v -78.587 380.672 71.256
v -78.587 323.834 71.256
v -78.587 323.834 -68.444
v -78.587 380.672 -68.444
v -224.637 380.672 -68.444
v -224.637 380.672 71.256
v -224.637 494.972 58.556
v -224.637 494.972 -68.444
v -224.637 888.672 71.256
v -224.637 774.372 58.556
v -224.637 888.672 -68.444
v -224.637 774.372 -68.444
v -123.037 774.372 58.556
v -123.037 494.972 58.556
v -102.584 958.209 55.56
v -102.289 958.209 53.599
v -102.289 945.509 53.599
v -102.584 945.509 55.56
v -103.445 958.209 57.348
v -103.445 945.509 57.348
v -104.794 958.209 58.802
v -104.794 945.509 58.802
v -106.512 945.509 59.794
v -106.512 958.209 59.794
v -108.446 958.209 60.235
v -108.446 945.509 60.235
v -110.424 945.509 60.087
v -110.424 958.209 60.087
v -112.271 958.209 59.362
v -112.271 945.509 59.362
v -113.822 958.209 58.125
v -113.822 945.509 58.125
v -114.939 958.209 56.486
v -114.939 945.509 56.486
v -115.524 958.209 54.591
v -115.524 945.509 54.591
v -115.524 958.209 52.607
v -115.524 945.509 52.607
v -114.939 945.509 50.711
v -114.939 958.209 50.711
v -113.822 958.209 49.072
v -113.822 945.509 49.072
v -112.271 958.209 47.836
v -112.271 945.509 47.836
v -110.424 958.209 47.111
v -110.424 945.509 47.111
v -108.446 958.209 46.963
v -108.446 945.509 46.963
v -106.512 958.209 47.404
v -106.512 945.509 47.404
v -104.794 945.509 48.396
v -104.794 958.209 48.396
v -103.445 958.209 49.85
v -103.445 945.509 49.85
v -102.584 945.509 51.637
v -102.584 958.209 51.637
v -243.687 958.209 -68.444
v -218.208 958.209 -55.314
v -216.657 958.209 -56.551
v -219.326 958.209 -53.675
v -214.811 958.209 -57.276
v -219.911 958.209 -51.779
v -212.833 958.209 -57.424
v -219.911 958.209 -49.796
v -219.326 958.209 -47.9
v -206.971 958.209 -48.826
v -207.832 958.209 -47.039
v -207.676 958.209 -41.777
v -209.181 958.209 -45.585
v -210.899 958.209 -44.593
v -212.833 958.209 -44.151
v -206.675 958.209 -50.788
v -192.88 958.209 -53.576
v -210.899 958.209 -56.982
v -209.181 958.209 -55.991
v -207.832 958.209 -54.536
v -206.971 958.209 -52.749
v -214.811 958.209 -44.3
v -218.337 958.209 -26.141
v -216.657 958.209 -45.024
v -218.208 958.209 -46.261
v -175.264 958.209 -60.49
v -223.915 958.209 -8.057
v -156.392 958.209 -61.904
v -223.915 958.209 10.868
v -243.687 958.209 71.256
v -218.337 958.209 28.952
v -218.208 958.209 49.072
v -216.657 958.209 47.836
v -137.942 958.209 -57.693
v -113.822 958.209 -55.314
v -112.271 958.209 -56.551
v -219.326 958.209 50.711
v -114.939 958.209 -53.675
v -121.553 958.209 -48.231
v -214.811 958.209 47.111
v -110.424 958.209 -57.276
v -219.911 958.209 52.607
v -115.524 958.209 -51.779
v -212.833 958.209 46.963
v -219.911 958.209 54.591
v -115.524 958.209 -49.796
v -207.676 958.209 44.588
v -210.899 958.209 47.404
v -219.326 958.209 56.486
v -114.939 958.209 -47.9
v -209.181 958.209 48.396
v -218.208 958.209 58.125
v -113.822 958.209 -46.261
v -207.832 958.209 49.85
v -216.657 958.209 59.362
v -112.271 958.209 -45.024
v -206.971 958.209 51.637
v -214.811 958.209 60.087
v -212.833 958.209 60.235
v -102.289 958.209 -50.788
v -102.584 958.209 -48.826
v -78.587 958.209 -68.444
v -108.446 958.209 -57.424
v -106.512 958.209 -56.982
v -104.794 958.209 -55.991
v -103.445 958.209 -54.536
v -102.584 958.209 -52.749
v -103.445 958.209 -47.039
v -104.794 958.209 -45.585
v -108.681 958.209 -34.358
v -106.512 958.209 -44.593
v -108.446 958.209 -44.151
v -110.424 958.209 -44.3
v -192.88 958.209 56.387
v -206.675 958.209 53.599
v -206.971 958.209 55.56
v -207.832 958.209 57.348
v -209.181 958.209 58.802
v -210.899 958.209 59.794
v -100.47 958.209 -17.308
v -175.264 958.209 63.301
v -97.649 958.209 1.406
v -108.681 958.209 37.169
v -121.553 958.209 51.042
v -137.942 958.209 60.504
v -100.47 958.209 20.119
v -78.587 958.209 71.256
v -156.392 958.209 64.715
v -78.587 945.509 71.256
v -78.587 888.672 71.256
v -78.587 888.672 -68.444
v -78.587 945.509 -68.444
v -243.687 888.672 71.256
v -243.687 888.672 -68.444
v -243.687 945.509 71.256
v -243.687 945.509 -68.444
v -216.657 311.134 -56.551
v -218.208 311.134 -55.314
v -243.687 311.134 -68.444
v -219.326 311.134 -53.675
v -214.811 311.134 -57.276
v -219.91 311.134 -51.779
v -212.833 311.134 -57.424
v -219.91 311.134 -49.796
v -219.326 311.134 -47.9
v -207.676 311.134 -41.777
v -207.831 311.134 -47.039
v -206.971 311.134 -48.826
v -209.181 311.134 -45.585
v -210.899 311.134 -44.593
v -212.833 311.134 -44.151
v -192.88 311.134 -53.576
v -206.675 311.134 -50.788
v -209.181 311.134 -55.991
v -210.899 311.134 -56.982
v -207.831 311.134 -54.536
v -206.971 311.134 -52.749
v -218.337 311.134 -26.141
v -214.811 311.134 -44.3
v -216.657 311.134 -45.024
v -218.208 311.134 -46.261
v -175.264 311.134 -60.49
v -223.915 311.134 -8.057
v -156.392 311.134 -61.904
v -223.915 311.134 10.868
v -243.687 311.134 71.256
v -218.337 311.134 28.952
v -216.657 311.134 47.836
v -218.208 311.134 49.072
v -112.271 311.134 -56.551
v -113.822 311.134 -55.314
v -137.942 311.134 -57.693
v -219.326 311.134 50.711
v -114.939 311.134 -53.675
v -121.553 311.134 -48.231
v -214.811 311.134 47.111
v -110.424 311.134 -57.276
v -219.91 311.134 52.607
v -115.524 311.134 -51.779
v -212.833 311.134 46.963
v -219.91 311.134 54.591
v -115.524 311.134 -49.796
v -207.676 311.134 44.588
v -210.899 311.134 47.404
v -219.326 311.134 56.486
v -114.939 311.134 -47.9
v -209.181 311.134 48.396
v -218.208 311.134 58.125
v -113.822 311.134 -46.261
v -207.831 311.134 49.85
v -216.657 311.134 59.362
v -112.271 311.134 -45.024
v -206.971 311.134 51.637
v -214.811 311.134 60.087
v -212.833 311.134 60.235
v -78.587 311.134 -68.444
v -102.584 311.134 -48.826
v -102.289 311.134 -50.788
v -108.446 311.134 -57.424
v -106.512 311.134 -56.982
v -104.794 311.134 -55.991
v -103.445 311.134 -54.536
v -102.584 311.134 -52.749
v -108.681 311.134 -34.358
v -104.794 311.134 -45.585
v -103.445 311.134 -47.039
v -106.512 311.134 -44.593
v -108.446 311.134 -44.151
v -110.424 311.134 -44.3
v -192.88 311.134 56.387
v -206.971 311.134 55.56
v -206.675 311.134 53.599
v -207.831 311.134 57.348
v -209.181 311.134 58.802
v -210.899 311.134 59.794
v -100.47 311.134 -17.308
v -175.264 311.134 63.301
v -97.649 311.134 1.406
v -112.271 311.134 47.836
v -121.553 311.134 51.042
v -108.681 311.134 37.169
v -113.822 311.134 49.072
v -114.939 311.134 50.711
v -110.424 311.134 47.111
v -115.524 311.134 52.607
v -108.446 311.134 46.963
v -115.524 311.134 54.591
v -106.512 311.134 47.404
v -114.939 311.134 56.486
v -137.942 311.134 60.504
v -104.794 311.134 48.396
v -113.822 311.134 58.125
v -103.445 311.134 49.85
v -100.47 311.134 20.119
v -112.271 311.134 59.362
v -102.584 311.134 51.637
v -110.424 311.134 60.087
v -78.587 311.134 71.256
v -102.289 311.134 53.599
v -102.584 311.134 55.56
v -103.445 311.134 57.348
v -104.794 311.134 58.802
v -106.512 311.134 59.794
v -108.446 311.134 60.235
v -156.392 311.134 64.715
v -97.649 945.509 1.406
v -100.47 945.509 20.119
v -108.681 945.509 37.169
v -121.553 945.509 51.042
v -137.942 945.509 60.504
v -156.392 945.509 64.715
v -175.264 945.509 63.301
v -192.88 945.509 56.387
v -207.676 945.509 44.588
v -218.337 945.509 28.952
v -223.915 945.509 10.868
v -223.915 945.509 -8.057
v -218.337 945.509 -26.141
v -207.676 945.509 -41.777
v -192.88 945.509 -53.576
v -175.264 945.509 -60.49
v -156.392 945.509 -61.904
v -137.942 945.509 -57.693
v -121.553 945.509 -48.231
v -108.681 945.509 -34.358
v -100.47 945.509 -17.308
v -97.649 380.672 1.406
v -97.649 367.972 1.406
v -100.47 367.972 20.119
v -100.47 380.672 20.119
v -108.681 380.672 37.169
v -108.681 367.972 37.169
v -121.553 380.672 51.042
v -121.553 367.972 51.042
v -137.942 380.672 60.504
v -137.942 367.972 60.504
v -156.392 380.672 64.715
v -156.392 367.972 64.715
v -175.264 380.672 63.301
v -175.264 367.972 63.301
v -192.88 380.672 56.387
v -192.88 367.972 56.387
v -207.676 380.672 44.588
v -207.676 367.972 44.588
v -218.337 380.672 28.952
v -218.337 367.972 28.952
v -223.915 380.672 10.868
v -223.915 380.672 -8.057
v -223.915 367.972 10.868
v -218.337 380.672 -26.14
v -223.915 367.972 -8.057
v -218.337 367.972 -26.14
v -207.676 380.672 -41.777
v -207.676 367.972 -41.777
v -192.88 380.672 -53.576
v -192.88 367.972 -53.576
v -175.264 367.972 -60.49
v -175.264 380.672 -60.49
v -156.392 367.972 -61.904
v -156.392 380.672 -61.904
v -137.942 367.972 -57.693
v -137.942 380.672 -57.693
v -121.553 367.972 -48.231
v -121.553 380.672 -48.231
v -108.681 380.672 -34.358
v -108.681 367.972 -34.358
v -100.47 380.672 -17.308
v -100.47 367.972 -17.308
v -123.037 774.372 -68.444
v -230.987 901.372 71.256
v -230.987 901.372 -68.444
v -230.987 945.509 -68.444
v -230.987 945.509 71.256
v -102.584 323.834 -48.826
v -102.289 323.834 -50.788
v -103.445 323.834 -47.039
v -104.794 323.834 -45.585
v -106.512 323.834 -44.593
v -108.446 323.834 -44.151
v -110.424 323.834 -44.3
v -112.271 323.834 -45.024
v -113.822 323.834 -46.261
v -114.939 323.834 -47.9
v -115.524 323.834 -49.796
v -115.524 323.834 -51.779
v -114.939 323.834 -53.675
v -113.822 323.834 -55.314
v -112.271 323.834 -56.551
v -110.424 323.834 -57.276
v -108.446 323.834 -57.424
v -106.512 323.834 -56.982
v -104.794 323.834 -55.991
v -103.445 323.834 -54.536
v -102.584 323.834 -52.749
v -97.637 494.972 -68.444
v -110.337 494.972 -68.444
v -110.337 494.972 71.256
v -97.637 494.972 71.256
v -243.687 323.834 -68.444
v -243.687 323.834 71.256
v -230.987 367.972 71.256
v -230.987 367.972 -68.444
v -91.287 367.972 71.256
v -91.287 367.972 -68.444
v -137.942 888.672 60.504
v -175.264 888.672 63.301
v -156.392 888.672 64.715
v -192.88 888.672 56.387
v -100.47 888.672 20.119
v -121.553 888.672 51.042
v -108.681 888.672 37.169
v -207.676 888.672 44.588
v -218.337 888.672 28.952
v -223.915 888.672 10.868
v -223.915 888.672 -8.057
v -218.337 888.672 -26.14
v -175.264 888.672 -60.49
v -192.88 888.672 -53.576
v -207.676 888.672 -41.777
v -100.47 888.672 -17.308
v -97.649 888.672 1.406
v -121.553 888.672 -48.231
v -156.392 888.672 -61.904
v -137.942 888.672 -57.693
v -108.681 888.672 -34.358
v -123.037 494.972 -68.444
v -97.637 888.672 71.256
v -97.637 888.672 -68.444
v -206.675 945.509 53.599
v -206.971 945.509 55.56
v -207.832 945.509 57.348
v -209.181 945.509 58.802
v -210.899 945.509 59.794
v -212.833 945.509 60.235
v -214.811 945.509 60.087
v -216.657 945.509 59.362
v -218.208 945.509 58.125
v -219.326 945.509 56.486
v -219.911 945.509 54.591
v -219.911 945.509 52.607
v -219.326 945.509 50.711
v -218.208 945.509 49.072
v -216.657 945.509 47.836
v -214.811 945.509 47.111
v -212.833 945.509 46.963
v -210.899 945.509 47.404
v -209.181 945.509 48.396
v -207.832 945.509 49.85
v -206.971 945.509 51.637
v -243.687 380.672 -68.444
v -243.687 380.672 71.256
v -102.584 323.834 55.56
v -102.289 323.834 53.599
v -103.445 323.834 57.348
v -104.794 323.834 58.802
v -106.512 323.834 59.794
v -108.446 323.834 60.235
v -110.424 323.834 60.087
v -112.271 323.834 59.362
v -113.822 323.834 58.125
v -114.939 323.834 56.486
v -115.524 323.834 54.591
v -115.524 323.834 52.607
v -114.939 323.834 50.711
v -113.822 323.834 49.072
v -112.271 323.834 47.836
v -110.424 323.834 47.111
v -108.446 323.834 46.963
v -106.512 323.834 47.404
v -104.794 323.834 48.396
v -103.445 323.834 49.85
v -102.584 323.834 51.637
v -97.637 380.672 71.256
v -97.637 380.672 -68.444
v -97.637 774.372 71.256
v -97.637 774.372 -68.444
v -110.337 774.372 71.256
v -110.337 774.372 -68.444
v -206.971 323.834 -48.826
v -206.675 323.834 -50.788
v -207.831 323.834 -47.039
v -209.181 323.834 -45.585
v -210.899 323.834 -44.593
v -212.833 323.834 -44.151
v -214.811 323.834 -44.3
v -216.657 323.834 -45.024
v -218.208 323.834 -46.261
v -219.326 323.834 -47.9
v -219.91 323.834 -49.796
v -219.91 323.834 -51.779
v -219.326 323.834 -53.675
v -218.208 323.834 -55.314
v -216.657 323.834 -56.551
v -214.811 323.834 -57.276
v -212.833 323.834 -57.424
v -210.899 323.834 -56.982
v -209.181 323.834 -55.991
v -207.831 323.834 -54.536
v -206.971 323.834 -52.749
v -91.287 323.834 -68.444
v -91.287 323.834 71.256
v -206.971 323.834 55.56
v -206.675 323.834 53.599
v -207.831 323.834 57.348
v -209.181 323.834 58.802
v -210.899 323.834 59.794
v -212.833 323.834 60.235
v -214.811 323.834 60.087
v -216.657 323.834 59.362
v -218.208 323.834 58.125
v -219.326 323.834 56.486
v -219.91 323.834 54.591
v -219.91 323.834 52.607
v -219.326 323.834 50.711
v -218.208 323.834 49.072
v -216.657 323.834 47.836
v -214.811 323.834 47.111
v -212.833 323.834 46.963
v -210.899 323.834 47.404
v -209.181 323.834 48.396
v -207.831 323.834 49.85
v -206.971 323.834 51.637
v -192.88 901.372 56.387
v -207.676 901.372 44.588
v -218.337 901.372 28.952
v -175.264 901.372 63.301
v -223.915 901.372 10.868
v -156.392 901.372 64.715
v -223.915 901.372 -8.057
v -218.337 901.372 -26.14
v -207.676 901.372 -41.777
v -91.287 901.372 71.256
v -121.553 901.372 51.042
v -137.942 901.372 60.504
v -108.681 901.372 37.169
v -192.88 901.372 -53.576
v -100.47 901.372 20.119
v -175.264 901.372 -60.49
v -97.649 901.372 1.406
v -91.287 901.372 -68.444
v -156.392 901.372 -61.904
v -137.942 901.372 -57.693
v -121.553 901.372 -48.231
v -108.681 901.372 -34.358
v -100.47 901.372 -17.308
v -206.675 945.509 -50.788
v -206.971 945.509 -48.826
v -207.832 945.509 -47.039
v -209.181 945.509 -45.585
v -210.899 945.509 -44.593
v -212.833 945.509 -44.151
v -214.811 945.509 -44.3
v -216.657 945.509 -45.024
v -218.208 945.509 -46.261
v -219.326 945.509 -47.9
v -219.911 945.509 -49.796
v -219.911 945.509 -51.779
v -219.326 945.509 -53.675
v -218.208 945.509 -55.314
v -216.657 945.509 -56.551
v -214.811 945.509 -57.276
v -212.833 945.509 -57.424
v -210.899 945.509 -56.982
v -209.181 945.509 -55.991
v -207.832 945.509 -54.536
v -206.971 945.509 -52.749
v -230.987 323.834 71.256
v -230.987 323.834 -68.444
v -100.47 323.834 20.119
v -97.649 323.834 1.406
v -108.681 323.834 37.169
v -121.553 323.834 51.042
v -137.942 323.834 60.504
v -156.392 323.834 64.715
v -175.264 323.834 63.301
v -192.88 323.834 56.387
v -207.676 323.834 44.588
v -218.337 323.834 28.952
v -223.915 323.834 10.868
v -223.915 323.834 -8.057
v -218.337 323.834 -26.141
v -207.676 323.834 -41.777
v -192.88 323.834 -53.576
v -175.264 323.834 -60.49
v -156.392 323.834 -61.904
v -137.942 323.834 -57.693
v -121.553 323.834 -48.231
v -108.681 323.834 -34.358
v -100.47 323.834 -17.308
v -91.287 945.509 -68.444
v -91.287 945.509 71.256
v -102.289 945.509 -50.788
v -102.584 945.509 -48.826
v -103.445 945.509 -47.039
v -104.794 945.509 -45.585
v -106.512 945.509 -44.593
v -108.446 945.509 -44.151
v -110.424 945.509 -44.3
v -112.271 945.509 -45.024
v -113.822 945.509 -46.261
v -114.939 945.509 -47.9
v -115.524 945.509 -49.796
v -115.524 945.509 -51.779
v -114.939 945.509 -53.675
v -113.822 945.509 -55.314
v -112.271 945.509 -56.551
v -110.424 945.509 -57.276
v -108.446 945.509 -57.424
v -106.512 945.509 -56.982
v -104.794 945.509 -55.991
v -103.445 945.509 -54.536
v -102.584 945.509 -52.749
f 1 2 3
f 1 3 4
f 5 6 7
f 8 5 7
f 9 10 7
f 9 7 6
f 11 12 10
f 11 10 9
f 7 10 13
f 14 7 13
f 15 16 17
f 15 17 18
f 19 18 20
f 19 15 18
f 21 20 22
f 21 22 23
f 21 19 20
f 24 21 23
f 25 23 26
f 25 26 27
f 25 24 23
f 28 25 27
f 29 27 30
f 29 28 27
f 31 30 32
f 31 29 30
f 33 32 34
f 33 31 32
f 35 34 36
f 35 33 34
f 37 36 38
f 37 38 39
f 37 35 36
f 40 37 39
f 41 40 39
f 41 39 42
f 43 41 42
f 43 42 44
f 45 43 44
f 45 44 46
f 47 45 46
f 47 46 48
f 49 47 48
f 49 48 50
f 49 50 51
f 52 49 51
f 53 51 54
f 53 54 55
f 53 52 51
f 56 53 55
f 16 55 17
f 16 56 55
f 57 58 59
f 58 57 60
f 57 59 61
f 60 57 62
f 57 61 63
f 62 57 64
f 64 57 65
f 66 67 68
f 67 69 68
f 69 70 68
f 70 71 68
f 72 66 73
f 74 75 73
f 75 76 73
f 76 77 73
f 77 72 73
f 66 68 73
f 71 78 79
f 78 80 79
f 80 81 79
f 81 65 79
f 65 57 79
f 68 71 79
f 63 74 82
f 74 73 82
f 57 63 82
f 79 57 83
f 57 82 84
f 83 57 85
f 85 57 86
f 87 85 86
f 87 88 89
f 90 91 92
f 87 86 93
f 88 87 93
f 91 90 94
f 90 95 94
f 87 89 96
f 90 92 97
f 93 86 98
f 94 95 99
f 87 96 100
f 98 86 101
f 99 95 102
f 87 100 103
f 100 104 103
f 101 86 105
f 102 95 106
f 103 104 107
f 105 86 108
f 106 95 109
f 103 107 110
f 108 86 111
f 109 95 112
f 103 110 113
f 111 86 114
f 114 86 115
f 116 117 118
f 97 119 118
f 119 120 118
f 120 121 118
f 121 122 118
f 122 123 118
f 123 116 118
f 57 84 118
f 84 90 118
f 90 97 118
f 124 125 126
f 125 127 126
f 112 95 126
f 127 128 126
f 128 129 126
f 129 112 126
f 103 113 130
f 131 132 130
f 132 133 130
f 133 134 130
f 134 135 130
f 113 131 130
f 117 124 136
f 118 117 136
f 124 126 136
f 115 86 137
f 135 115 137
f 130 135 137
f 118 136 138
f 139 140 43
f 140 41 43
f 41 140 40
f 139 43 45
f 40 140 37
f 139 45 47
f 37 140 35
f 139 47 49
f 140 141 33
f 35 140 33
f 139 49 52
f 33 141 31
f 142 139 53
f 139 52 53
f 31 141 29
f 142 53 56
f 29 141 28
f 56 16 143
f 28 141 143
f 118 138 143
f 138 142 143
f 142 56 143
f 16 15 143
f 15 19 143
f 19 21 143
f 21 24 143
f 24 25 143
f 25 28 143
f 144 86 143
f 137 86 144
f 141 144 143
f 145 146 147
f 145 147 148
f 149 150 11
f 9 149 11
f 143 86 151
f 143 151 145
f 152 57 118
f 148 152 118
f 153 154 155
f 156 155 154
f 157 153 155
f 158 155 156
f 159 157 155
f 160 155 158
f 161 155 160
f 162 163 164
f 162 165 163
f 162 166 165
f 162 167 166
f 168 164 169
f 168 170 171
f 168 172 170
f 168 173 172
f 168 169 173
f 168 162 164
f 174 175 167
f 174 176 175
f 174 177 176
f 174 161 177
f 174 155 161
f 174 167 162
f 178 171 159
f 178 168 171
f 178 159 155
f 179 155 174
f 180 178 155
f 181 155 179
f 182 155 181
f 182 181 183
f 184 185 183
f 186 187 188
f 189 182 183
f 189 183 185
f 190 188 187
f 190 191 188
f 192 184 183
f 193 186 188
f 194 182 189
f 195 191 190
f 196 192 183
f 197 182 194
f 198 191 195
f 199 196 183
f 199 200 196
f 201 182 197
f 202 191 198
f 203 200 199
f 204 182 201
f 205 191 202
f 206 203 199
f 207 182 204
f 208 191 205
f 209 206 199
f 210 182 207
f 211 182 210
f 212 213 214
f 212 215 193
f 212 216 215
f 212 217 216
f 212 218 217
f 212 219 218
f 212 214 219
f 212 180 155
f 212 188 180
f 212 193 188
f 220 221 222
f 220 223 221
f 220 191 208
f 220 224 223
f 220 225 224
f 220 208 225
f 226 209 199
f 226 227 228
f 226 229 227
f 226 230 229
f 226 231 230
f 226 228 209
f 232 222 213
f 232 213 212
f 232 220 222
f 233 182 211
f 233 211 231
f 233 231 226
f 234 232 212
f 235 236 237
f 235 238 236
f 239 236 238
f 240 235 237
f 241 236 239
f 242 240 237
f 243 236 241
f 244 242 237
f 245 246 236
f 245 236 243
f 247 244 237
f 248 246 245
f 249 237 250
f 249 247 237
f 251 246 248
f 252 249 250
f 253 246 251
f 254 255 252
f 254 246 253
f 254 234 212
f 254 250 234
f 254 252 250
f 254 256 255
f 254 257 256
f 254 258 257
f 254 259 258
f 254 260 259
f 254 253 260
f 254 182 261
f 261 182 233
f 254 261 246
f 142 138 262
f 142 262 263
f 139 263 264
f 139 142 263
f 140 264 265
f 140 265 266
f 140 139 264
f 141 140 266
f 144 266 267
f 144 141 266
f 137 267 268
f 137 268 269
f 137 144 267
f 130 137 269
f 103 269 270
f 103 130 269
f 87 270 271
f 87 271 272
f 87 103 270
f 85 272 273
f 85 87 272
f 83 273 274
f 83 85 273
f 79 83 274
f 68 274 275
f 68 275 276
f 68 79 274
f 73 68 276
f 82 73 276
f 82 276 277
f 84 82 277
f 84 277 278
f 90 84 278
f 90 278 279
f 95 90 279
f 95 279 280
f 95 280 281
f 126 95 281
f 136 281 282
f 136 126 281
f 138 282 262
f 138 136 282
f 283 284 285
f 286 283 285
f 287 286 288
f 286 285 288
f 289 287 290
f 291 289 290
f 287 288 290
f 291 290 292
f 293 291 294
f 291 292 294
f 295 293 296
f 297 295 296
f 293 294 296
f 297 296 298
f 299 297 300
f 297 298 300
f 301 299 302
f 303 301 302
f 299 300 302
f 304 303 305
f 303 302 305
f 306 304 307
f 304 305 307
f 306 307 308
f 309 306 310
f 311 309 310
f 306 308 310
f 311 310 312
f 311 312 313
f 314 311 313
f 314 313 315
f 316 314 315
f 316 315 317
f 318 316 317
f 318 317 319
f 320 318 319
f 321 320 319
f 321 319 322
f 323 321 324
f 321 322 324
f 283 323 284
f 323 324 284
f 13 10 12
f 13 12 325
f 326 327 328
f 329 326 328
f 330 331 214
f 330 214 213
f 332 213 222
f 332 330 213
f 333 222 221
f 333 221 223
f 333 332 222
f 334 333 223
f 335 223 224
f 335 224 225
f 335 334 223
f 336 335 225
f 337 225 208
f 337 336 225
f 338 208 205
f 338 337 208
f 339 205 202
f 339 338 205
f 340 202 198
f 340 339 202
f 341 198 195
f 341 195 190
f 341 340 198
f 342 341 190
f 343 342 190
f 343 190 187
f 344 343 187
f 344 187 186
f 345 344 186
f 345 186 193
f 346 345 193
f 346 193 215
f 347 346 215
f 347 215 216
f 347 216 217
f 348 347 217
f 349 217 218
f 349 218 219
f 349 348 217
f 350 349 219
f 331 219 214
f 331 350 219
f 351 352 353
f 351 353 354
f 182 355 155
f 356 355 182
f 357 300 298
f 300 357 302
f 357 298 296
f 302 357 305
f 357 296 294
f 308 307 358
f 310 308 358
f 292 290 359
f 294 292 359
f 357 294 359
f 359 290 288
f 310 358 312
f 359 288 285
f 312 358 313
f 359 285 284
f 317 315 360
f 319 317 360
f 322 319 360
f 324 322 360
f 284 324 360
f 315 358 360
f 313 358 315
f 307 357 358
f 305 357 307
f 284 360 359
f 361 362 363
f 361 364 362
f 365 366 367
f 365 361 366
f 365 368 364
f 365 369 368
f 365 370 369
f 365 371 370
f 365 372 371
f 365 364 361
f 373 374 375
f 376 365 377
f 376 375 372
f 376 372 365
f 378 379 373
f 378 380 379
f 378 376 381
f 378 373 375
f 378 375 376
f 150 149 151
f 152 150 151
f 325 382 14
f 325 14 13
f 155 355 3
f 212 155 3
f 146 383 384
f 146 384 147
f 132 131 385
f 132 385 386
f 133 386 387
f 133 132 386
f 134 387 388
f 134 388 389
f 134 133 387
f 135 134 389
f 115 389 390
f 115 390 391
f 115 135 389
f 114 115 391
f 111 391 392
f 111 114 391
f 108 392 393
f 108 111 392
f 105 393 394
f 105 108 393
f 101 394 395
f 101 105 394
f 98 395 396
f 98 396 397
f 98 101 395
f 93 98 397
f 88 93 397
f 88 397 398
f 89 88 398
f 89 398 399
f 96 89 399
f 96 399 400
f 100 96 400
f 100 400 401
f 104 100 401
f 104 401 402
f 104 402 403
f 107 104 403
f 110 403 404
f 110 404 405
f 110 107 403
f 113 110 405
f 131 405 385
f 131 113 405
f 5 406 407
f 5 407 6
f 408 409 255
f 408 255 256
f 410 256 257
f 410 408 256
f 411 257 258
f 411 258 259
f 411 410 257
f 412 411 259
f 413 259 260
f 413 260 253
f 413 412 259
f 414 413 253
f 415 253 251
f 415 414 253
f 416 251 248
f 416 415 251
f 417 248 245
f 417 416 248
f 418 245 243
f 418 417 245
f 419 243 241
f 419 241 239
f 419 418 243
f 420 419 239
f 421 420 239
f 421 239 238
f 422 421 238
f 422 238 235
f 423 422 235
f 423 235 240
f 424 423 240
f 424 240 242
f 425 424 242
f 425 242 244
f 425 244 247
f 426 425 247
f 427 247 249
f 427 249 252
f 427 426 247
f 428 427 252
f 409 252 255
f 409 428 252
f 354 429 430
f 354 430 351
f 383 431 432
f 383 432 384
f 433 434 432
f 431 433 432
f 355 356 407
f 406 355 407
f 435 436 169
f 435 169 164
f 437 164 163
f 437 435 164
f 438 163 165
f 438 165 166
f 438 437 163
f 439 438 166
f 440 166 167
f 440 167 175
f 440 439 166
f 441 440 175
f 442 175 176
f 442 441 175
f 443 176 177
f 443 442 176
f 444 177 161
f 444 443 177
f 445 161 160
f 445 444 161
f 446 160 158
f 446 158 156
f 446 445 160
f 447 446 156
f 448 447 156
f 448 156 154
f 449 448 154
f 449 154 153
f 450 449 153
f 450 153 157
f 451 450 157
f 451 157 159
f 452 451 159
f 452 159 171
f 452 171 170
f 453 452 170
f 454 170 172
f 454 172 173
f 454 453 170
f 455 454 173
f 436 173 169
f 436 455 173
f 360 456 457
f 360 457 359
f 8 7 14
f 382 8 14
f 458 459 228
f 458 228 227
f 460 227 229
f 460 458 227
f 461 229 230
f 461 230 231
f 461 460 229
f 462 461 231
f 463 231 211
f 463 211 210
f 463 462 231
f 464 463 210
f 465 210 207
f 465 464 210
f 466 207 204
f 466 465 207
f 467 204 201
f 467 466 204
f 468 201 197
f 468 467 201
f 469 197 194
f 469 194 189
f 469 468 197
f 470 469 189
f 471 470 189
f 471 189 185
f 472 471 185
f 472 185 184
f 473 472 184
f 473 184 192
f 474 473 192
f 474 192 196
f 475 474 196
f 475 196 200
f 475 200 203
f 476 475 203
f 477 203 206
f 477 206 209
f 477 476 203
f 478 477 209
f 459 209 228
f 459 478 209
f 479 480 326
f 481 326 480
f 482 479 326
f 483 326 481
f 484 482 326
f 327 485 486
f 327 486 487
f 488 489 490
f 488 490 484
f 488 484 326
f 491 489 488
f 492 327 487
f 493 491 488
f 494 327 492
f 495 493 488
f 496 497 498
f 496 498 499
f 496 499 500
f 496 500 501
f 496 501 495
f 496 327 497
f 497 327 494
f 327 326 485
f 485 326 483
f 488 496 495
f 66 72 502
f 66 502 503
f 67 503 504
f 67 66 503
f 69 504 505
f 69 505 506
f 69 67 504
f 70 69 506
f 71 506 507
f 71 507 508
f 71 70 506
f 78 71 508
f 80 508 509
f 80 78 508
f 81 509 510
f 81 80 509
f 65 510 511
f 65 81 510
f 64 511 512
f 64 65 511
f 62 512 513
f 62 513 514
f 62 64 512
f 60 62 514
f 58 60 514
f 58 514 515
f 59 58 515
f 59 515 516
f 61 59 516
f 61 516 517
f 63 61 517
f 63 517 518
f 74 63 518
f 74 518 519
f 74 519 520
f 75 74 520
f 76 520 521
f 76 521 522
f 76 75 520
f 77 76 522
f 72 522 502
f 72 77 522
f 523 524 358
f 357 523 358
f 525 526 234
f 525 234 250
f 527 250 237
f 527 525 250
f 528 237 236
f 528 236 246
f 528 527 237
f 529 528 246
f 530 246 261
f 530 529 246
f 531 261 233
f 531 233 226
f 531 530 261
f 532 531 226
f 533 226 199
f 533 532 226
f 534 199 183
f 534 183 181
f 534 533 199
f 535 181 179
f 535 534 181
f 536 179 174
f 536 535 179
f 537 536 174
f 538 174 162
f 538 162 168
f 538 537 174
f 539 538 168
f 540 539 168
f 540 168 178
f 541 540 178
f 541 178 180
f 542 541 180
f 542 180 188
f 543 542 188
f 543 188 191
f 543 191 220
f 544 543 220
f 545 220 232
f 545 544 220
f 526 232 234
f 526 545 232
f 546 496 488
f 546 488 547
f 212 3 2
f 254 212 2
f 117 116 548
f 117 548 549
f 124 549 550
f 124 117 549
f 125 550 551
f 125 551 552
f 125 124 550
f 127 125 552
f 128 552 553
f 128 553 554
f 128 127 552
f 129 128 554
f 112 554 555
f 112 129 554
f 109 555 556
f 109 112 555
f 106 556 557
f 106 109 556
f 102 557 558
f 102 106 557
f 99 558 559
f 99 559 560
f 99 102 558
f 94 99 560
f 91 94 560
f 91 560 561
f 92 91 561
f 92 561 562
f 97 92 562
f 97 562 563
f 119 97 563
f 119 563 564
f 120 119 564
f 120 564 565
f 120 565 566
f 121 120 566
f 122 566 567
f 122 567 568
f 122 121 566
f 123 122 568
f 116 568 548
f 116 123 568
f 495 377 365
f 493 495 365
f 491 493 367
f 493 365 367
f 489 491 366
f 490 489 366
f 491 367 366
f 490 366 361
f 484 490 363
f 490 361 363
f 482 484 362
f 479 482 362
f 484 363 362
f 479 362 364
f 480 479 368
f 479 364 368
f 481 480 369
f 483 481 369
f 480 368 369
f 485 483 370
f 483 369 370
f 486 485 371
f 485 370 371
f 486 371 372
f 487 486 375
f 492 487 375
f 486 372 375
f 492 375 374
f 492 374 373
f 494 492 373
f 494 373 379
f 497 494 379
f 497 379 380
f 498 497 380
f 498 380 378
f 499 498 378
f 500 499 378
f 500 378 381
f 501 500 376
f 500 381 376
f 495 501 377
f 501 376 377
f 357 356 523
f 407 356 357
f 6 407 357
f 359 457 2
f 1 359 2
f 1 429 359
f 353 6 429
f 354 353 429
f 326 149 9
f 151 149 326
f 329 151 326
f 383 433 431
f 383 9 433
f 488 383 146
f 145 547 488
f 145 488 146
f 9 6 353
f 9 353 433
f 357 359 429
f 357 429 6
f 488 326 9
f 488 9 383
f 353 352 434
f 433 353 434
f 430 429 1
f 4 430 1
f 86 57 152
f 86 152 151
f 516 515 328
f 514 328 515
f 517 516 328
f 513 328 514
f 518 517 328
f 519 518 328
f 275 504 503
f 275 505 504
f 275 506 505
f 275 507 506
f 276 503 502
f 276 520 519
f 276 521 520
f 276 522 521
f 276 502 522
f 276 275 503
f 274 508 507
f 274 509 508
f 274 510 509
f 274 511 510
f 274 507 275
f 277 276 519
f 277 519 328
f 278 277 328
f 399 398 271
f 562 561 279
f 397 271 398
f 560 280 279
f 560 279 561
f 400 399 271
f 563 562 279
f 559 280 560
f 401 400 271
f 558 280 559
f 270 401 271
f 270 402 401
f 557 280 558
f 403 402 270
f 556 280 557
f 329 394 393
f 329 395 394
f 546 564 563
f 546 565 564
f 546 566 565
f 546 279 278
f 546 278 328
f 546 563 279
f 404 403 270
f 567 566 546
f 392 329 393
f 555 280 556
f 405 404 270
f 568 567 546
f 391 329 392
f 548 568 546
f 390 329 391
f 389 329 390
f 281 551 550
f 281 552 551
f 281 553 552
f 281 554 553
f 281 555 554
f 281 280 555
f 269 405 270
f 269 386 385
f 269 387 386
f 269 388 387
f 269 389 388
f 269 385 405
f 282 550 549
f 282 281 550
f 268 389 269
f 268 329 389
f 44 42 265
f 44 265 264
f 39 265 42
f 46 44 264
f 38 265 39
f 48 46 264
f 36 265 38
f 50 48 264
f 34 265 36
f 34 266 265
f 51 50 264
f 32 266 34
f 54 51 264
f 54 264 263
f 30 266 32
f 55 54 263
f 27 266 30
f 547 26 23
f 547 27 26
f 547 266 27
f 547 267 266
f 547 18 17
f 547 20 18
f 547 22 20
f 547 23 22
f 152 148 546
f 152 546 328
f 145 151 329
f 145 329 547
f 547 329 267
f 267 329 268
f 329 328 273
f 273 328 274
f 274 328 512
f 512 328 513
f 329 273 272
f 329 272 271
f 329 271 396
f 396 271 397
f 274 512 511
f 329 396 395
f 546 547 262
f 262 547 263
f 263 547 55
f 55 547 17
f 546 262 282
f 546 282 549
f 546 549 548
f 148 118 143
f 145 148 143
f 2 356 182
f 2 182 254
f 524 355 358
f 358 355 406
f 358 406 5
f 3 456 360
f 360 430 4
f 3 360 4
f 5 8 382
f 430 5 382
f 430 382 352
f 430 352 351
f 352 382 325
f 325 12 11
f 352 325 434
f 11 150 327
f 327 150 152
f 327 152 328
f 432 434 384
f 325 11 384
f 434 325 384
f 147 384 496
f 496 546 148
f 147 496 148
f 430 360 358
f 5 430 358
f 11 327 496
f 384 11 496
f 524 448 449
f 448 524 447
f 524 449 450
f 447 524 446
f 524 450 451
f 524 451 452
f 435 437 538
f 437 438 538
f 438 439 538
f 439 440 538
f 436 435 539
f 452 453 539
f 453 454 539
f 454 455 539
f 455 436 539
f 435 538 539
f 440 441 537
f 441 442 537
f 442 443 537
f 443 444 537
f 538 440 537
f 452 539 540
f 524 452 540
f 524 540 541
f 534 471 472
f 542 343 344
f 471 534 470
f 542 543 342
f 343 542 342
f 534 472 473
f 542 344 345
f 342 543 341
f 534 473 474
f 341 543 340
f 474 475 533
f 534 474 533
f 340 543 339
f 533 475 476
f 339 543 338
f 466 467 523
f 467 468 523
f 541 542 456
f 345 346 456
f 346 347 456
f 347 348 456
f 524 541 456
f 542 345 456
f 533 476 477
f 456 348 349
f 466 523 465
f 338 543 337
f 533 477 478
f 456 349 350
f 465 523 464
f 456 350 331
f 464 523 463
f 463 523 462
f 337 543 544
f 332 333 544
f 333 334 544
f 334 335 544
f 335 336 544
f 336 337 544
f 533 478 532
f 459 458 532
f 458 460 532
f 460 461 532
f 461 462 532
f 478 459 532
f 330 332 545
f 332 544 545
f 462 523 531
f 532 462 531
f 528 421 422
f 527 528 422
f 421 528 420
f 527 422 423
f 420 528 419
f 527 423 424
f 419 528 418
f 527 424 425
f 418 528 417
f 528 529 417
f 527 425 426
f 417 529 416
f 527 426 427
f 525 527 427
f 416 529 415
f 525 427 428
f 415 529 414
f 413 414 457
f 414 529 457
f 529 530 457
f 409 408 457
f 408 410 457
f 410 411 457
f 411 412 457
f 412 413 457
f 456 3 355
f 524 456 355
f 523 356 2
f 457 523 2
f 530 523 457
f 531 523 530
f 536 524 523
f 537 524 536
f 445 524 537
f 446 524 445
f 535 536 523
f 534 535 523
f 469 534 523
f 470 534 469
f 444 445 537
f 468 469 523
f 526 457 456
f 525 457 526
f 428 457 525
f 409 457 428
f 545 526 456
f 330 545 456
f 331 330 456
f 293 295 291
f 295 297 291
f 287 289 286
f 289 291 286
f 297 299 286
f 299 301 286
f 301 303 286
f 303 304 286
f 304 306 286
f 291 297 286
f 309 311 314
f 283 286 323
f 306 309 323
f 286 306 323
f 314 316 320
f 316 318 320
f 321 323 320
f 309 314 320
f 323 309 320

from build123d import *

# Parameters (mm, degrees)
BOX003_W                 = 101.6
BOX003_H                 = 279.4
BOX003_DEPTH             = 12.7
BOX009_W                 = 12.7
BOX009_H                 = 44.1376
BOX009_DEPTH             = 139.7
BOX006_W                 = 12.7
BOX006_H                 = 44.1376
BOX006_DEPTH             = 139.7
BOX007_W                 = 12.7
BOX007_H                 = 44.1376
BOX007_DEPTH             = 139.7
SKETCH002_W              = 165.100117
SKETCH002_H              = 139.700117
SKETCH002_R              = 6.6548
SKETCH002_R_2            = 63.4873
PAD_DEPTH                = 12.7
CLONE001_PLACEMENT_ANGLE = 180
CLONE_PLACEMENT_ANGLE    = 180
BOX010_W                 = 165.1
BOX010_H                 = 12.7
BOX010_DEPTH             = 139.7
SKETCH004_R              = 63.4873
POCKET_DEPTH             = 12.7
BOX008_W                 = 12.7
BOX008_H                 = 44.1376
BOX008_DEPTH             = 139.7
BOX_W                    = 127
BOX_H                    = 114.3
BOX_DEPTH                = 139.7
BOX002_W                 = 12.7
BOX002_H                 = 279.4
BOX002_DEPTH             = 139.7


with BuildPart() as cube003:
    # Box003 → Box003 (new body)
    with BuildSketch(Plane(origin=(-224.636743, 494.971814, 58.555664), x_dir=(1, 0, 0), z_dir=(0, 0, 1))):
        with Locations((50.8, 139.7)):
            Rectangle(BOX003_W, BOX003_H)
    extrude(amount=BOX003_DEPTH)


with BuildPart() as cube009:
    # Box009 → Box009 (new body)
    with BuildSketch(Plane(origin=(-91.286743, 901.371814, -68.444336), x_dir=(1, 0, 0), z_dir=(0, 0, 1))):
        with Locations((6.35, 22.0688)):
            Rectangle(BOX009_W, BOX009_H)
    extrude(amount=BOX009_DEPTH)


with BuildPart() as cube006:
    # Box006 → Box006 (new body)
    with BuildSketch(Plane(origin=(-243.686743, 323.834214, -68.444336), x_dir=(1, 0, 0), z_dir=(0, 0, 1))):
        with Locations((6.35, 22.0688)):
            Rectangle(BOX006_W, BOX006_H)
    extrude(amount=BOX006_DEPTH)


with BuildPart() as cube007:
    # Box007 → Box007 (new body)
    with BuildSketch(Plane(origin=(-243.686743, 901.371814, -68.444336), x_dir=(1, 0, 0), z_dir=(0, 0, 1))):
        with Locations((6.35, 22.0688)):
            Rectangle(BOX007_W, BOX007_H)
    extrude(amount=BOX007_DEPTH)


with BuildPart() as pad:
    # Sketch002 → Pad (new body)
    with BuildSketch(Plane(origin=(0, 37.338, 0), x_dir=(-1, 0, 0), z_dir=(0, 1, 0))):
        with Locations((-69.215058, 89.86448)):
            Rectangle(SKETCH002_W, SKETCH002_H)
        with Locations((-121.408307, 142.057728)):
            Circle(SKETCH002_R, mode=Mode.SUBTRACT)
        with Locations((-17.02181, 142.057728)):
            Circle(SKETCH002_R, mode=Mode.SUBTRACT)
        with Locations((-17.02181, 37.671231)):
            Circle(SKETCH002_R, mode=Mode.SUBTRACT)
        with Locations((-121.408307, 37.671231)):
            Circle(SKETCH002_R, mode=Mode.SUBTRACT)
        with Locations((-69.215, 89.864421)):
            Circle(SKETCH002_R_2, mode=Mode.SUBTRACT)
    extrude(amount=PAD_DEPTH)


with BuildPart() as clone_of_pad001:
    # Clone001 base: copy of Pad
    add(pad.part)


with BuildPart() as clone_of_pad001_1:
    # Clone001 placement: moved
    add(clone_of_pad001.part.moved(Location((-91.921743, 995.547414, -88.458874))).rotate(Axis((-91.921743, 995.547414, -88.458874), (0, 0, 1)), CLONE001_PLACEMENT_ANGLE))


with BuildPart() as clone_of_pad:
    # Clone base: copy of Pad
    add(pad.part)


with BuildPart() as clone_of_pad_1:
    # Clone placement: moved
    add(clone_of_pad.part.moved(Location((-91.921626, 361.172214, -88.458874))).rotate(Axis((-91.921626, 361.172214, -88.458874), (0, 0, 1)), CLONE_PLACEMENT_ANGLE))


with BuildPart() as pocket:
    # Box010 → Box010 (new body)
    with BuildSketch(Plane(origin=(-102.435181, 88.203278, -436.376007), x_dir=(1, 0, 0), z_dir=(0, 0, 1))):
        with Locations((82.55, 6.35)):
            Rectangle(BOX010_W, BOX010_H)
    extrude(amount=BOX010_DEPTH)

    # Sketch004 → Pocket (cut)
    with BuildSketch(Plane(origin=(-102.435181, 88.203278, -436.376007), x_dir=(1, 0, 0), z_dir=(0, -1, 0))):
        with Locations((82.55, 69.85)):
            Circle(SKETCH004_R)
    extrude(amount=-POCKET_DEPTH, mode=Mode.SUBTRACT)


with BuildPart() as clone_of_pocket003005005:
    # Clone006 base: copy of Pocket
    add(pocket.part)


with BuildPart() as clone_of_pocket003005005_1:
    # Clone006 placement: moved
    add(clone_of_pocket003005005.part.moved(Location((-141.251562, 800.468536, 367.931671))))


with BuildPart() as clone_of_pocket:
    # Clone005 base: copy of Pocket
    add(pocket.part)


with BuildPart() as clone_of_pocket_1:
    # Clone005 placement: moved
    add(clone_of_pocket.part.moved(Location((-141.251562, 279.768536, 367.931671))))


with BuildPart() as cube008:
    # Box008 → Box008 (new body)
    with BuildSketch(Plane(origin=(-91.286743, 323.834214, -68.444336), x_dir=(1, 0, 0), z_dir=(0, 0, 1))):
        with Locations((6.35, 22.0688)):
            Rectangle(BOX008_W, BOX008_H)
    extrude(amount=BOX008_DEPTH)


with BuildPart() as cube:
    # Box → Box (new body)
    with BuildSketch(Plane(origin=(-224.636743, 380.671814, -68.444336), x_dir=(1, 0, 0), z_dir=(0, 0, 1))):
        with Locations((63.5, 57.15)):
            Rectangle(BOX_W, BOX_H)
    extrude(amount=BOX_DEPTH)


with BuildPart() as clone_of_cube:
    # Clone008 base: copy of Cube
    add(cube.part)


with BuildPart() as clone_of_cube_1:
    # Clone008 placement: moved
    add(clone_of_cube.part.moved(Location((0, 393.7, 0))))


with BuildPart() as fusion:
    # Box002 → Box002 (new body)
    with BuildSketch(Plane(origin=(-123.036743, 494.971814, -68.444336), x_dir=(1, 0, 0), z_dir=(0, 0, 1))):
        with Locations((6.35, 139.7)):
            Rectangle(BOX002_W, BOX002_H)
    extrude(amount=BOX002_DEPTH)

    # Fusion: union Cube003, Cube009, Cube006, Cube007, Clone of Pad001, Clone of Pad, Clone of Pocket003005005, Clone of Pocket, Cube008, Clone of Cube, Cube
    add(cube003.part)
    add(cube009.part)
    add(cube006.part)
    add(cube007.part)
    add(clone_of_pad001_1.part)
    add(clone_of_pad_1.part)
    add(clone_of_pocket003005005_1.part)
    add(clone_of_pocket_1.part)
    add(cube008.part)
    add(clone_of_cube_1.part)
    add(cube.part)


solid = fusion.part
